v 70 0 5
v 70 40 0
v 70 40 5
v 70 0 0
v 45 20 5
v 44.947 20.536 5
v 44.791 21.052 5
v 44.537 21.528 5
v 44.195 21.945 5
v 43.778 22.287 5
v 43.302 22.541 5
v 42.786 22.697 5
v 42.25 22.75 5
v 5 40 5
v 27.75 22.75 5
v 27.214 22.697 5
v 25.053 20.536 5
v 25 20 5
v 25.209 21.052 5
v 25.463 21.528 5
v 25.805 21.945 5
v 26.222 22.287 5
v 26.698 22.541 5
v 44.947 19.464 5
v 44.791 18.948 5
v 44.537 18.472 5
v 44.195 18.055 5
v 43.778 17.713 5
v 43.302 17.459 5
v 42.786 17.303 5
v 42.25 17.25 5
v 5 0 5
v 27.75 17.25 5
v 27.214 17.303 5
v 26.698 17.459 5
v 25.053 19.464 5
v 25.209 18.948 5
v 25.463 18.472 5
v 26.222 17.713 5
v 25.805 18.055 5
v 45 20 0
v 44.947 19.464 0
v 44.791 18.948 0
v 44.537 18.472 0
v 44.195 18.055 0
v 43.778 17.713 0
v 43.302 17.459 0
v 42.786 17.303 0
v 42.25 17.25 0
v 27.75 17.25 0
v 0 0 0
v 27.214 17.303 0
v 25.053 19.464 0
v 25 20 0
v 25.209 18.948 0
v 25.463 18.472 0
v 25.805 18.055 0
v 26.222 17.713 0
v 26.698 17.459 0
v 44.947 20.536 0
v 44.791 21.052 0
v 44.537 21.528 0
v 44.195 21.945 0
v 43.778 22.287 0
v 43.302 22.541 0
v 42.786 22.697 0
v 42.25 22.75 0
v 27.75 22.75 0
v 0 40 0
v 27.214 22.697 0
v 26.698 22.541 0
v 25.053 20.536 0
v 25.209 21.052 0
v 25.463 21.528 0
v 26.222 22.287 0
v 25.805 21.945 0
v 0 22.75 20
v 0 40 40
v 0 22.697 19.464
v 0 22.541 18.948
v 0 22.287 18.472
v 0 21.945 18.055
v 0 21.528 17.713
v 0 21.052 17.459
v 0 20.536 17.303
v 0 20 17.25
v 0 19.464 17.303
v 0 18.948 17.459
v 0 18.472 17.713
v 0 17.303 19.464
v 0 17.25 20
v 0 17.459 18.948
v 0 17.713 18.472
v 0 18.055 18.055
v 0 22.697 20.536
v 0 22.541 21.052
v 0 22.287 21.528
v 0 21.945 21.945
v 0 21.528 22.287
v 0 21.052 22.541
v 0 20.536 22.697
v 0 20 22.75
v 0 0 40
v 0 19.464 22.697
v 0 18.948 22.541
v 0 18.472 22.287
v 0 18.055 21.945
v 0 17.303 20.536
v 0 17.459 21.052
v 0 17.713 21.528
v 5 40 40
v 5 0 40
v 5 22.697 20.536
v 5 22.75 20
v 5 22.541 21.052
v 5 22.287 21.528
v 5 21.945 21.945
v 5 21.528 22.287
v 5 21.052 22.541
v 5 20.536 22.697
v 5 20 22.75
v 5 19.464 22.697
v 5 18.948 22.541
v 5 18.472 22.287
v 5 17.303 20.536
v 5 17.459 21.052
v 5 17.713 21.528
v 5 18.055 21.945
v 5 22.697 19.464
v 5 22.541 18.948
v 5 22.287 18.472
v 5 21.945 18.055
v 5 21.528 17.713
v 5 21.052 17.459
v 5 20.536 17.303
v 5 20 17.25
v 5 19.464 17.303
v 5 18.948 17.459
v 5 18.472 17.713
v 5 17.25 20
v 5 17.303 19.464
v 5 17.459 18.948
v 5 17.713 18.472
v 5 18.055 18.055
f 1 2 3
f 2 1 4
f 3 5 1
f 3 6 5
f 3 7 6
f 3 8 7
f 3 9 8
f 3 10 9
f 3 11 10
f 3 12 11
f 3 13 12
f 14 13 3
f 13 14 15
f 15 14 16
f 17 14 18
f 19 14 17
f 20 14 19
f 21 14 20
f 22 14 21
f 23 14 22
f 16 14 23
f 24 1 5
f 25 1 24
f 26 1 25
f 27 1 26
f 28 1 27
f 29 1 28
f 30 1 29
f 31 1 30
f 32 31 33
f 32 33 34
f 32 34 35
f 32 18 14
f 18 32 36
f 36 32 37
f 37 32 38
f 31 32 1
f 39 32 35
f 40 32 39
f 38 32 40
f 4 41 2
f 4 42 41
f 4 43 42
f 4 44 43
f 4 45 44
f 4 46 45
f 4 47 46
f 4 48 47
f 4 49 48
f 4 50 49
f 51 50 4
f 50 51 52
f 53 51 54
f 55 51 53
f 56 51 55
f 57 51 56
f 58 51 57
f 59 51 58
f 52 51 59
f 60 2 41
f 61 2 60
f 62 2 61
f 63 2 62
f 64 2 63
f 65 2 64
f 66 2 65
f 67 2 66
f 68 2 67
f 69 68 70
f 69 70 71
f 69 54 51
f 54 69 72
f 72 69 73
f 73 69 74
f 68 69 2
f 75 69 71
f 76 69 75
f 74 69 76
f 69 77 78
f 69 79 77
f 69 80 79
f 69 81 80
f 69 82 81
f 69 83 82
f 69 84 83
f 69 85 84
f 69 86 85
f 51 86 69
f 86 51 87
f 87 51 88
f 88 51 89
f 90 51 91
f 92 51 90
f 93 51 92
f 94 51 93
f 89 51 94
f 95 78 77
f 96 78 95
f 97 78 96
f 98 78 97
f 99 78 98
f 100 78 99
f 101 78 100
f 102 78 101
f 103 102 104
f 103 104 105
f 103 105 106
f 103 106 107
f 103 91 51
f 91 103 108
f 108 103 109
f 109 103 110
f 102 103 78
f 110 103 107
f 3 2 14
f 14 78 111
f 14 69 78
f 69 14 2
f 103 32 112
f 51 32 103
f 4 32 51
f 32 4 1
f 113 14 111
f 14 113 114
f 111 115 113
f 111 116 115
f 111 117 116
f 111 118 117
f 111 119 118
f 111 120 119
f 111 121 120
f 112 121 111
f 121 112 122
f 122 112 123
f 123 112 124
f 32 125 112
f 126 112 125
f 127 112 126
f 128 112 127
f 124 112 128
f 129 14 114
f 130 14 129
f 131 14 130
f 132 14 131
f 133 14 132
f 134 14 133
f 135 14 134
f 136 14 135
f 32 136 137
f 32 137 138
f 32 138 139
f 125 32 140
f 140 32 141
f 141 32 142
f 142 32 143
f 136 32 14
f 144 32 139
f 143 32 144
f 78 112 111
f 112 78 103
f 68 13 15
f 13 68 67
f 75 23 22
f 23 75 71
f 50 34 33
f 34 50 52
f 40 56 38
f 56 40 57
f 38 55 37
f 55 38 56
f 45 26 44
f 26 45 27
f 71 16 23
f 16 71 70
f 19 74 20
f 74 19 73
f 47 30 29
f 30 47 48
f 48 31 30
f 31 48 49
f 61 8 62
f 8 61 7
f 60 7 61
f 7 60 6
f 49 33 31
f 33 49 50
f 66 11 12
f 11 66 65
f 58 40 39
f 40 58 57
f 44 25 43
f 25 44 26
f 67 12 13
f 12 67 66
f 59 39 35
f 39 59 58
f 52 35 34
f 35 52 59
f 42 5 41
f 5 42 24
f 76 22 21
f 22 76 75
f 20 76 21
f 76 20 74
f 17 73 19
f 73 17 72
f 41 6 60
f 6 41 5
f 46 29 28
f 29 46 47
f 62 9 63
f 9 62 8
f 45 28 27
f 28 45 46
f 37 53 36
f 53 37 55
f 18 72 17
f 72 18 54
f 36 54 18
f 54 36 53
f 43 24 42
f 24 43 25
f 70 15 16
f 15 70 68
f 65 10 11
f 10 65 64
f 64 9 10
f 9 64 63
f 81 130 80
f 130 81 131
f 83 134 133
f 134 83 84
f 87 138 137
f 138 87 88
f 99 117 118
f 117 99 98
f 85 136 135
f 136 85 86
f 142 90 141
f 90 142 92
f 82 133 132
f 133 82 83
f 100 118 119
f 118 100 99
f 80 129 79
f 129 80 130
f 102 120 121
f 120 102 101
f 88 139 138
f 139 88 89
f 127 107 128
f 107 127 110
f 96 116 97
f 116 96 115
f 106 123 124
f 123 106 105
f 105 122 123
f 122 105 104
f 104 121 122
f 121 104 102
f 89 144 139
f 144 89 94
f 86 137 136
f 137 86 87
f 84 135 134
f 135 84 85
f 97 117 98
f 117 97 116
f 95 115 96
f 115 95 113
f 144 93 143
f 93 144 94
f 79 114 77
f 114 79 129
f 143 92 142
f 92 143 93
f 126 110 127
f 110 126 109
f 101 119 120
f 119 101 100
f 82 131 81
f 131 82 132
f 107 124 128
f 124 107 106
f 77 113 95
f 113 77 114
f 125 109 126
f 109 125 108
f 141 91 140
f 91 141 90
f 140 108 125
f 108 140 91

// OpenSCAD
$fn = 32;

// ----------------------------------------------------------------------
// L-bracket: 70 x 40 x 40 mm
// ----------------------------------------------------------------------

// --- parameters (mm) ---
run_out = 70;             // horizontal leg, X
rise = 40;                // vertical leg, Z
bracket_w = 40;           // bracket depth, Y
sheet_t = 5;              // plate thickness
hole_d = 5.5;             // clearance for M5
slot_l = 20;              // adjustment slot length

module hole_z(px, py) {
  translate([px, py, -0.5]) cylinder(h = sheet_t + 1, d = hole_d);
}
module hole_x(pz, py) {
  translate([-0.5, py, pz]) rotate([0, 90, 0]) cylinder(h = sheet_t + 1, d = hole_d);
}
module adjust_slot(px, py) {
  hull() {
    translate([px - (slot_l - hole_d) / 2, py, -0.5]) cylinder(h = sheet_t + 1, d = hole_d);
    translate([px + (slot_l - hole_d) / 2, py, -0.5]) cylinder(h = sheet_t + 1, d = hole_d);
  }
}

difference() {
  union() {
    /* horizontal leg */
    cube([run_out, bracket_w, sheet_t]);
    /* vertical leg, overlapping the corner block */
    cube([sheet_t, bracket_w, rise]);
  }
  adjust_slot(35, 20);
  hole_x(20, 20);
}
